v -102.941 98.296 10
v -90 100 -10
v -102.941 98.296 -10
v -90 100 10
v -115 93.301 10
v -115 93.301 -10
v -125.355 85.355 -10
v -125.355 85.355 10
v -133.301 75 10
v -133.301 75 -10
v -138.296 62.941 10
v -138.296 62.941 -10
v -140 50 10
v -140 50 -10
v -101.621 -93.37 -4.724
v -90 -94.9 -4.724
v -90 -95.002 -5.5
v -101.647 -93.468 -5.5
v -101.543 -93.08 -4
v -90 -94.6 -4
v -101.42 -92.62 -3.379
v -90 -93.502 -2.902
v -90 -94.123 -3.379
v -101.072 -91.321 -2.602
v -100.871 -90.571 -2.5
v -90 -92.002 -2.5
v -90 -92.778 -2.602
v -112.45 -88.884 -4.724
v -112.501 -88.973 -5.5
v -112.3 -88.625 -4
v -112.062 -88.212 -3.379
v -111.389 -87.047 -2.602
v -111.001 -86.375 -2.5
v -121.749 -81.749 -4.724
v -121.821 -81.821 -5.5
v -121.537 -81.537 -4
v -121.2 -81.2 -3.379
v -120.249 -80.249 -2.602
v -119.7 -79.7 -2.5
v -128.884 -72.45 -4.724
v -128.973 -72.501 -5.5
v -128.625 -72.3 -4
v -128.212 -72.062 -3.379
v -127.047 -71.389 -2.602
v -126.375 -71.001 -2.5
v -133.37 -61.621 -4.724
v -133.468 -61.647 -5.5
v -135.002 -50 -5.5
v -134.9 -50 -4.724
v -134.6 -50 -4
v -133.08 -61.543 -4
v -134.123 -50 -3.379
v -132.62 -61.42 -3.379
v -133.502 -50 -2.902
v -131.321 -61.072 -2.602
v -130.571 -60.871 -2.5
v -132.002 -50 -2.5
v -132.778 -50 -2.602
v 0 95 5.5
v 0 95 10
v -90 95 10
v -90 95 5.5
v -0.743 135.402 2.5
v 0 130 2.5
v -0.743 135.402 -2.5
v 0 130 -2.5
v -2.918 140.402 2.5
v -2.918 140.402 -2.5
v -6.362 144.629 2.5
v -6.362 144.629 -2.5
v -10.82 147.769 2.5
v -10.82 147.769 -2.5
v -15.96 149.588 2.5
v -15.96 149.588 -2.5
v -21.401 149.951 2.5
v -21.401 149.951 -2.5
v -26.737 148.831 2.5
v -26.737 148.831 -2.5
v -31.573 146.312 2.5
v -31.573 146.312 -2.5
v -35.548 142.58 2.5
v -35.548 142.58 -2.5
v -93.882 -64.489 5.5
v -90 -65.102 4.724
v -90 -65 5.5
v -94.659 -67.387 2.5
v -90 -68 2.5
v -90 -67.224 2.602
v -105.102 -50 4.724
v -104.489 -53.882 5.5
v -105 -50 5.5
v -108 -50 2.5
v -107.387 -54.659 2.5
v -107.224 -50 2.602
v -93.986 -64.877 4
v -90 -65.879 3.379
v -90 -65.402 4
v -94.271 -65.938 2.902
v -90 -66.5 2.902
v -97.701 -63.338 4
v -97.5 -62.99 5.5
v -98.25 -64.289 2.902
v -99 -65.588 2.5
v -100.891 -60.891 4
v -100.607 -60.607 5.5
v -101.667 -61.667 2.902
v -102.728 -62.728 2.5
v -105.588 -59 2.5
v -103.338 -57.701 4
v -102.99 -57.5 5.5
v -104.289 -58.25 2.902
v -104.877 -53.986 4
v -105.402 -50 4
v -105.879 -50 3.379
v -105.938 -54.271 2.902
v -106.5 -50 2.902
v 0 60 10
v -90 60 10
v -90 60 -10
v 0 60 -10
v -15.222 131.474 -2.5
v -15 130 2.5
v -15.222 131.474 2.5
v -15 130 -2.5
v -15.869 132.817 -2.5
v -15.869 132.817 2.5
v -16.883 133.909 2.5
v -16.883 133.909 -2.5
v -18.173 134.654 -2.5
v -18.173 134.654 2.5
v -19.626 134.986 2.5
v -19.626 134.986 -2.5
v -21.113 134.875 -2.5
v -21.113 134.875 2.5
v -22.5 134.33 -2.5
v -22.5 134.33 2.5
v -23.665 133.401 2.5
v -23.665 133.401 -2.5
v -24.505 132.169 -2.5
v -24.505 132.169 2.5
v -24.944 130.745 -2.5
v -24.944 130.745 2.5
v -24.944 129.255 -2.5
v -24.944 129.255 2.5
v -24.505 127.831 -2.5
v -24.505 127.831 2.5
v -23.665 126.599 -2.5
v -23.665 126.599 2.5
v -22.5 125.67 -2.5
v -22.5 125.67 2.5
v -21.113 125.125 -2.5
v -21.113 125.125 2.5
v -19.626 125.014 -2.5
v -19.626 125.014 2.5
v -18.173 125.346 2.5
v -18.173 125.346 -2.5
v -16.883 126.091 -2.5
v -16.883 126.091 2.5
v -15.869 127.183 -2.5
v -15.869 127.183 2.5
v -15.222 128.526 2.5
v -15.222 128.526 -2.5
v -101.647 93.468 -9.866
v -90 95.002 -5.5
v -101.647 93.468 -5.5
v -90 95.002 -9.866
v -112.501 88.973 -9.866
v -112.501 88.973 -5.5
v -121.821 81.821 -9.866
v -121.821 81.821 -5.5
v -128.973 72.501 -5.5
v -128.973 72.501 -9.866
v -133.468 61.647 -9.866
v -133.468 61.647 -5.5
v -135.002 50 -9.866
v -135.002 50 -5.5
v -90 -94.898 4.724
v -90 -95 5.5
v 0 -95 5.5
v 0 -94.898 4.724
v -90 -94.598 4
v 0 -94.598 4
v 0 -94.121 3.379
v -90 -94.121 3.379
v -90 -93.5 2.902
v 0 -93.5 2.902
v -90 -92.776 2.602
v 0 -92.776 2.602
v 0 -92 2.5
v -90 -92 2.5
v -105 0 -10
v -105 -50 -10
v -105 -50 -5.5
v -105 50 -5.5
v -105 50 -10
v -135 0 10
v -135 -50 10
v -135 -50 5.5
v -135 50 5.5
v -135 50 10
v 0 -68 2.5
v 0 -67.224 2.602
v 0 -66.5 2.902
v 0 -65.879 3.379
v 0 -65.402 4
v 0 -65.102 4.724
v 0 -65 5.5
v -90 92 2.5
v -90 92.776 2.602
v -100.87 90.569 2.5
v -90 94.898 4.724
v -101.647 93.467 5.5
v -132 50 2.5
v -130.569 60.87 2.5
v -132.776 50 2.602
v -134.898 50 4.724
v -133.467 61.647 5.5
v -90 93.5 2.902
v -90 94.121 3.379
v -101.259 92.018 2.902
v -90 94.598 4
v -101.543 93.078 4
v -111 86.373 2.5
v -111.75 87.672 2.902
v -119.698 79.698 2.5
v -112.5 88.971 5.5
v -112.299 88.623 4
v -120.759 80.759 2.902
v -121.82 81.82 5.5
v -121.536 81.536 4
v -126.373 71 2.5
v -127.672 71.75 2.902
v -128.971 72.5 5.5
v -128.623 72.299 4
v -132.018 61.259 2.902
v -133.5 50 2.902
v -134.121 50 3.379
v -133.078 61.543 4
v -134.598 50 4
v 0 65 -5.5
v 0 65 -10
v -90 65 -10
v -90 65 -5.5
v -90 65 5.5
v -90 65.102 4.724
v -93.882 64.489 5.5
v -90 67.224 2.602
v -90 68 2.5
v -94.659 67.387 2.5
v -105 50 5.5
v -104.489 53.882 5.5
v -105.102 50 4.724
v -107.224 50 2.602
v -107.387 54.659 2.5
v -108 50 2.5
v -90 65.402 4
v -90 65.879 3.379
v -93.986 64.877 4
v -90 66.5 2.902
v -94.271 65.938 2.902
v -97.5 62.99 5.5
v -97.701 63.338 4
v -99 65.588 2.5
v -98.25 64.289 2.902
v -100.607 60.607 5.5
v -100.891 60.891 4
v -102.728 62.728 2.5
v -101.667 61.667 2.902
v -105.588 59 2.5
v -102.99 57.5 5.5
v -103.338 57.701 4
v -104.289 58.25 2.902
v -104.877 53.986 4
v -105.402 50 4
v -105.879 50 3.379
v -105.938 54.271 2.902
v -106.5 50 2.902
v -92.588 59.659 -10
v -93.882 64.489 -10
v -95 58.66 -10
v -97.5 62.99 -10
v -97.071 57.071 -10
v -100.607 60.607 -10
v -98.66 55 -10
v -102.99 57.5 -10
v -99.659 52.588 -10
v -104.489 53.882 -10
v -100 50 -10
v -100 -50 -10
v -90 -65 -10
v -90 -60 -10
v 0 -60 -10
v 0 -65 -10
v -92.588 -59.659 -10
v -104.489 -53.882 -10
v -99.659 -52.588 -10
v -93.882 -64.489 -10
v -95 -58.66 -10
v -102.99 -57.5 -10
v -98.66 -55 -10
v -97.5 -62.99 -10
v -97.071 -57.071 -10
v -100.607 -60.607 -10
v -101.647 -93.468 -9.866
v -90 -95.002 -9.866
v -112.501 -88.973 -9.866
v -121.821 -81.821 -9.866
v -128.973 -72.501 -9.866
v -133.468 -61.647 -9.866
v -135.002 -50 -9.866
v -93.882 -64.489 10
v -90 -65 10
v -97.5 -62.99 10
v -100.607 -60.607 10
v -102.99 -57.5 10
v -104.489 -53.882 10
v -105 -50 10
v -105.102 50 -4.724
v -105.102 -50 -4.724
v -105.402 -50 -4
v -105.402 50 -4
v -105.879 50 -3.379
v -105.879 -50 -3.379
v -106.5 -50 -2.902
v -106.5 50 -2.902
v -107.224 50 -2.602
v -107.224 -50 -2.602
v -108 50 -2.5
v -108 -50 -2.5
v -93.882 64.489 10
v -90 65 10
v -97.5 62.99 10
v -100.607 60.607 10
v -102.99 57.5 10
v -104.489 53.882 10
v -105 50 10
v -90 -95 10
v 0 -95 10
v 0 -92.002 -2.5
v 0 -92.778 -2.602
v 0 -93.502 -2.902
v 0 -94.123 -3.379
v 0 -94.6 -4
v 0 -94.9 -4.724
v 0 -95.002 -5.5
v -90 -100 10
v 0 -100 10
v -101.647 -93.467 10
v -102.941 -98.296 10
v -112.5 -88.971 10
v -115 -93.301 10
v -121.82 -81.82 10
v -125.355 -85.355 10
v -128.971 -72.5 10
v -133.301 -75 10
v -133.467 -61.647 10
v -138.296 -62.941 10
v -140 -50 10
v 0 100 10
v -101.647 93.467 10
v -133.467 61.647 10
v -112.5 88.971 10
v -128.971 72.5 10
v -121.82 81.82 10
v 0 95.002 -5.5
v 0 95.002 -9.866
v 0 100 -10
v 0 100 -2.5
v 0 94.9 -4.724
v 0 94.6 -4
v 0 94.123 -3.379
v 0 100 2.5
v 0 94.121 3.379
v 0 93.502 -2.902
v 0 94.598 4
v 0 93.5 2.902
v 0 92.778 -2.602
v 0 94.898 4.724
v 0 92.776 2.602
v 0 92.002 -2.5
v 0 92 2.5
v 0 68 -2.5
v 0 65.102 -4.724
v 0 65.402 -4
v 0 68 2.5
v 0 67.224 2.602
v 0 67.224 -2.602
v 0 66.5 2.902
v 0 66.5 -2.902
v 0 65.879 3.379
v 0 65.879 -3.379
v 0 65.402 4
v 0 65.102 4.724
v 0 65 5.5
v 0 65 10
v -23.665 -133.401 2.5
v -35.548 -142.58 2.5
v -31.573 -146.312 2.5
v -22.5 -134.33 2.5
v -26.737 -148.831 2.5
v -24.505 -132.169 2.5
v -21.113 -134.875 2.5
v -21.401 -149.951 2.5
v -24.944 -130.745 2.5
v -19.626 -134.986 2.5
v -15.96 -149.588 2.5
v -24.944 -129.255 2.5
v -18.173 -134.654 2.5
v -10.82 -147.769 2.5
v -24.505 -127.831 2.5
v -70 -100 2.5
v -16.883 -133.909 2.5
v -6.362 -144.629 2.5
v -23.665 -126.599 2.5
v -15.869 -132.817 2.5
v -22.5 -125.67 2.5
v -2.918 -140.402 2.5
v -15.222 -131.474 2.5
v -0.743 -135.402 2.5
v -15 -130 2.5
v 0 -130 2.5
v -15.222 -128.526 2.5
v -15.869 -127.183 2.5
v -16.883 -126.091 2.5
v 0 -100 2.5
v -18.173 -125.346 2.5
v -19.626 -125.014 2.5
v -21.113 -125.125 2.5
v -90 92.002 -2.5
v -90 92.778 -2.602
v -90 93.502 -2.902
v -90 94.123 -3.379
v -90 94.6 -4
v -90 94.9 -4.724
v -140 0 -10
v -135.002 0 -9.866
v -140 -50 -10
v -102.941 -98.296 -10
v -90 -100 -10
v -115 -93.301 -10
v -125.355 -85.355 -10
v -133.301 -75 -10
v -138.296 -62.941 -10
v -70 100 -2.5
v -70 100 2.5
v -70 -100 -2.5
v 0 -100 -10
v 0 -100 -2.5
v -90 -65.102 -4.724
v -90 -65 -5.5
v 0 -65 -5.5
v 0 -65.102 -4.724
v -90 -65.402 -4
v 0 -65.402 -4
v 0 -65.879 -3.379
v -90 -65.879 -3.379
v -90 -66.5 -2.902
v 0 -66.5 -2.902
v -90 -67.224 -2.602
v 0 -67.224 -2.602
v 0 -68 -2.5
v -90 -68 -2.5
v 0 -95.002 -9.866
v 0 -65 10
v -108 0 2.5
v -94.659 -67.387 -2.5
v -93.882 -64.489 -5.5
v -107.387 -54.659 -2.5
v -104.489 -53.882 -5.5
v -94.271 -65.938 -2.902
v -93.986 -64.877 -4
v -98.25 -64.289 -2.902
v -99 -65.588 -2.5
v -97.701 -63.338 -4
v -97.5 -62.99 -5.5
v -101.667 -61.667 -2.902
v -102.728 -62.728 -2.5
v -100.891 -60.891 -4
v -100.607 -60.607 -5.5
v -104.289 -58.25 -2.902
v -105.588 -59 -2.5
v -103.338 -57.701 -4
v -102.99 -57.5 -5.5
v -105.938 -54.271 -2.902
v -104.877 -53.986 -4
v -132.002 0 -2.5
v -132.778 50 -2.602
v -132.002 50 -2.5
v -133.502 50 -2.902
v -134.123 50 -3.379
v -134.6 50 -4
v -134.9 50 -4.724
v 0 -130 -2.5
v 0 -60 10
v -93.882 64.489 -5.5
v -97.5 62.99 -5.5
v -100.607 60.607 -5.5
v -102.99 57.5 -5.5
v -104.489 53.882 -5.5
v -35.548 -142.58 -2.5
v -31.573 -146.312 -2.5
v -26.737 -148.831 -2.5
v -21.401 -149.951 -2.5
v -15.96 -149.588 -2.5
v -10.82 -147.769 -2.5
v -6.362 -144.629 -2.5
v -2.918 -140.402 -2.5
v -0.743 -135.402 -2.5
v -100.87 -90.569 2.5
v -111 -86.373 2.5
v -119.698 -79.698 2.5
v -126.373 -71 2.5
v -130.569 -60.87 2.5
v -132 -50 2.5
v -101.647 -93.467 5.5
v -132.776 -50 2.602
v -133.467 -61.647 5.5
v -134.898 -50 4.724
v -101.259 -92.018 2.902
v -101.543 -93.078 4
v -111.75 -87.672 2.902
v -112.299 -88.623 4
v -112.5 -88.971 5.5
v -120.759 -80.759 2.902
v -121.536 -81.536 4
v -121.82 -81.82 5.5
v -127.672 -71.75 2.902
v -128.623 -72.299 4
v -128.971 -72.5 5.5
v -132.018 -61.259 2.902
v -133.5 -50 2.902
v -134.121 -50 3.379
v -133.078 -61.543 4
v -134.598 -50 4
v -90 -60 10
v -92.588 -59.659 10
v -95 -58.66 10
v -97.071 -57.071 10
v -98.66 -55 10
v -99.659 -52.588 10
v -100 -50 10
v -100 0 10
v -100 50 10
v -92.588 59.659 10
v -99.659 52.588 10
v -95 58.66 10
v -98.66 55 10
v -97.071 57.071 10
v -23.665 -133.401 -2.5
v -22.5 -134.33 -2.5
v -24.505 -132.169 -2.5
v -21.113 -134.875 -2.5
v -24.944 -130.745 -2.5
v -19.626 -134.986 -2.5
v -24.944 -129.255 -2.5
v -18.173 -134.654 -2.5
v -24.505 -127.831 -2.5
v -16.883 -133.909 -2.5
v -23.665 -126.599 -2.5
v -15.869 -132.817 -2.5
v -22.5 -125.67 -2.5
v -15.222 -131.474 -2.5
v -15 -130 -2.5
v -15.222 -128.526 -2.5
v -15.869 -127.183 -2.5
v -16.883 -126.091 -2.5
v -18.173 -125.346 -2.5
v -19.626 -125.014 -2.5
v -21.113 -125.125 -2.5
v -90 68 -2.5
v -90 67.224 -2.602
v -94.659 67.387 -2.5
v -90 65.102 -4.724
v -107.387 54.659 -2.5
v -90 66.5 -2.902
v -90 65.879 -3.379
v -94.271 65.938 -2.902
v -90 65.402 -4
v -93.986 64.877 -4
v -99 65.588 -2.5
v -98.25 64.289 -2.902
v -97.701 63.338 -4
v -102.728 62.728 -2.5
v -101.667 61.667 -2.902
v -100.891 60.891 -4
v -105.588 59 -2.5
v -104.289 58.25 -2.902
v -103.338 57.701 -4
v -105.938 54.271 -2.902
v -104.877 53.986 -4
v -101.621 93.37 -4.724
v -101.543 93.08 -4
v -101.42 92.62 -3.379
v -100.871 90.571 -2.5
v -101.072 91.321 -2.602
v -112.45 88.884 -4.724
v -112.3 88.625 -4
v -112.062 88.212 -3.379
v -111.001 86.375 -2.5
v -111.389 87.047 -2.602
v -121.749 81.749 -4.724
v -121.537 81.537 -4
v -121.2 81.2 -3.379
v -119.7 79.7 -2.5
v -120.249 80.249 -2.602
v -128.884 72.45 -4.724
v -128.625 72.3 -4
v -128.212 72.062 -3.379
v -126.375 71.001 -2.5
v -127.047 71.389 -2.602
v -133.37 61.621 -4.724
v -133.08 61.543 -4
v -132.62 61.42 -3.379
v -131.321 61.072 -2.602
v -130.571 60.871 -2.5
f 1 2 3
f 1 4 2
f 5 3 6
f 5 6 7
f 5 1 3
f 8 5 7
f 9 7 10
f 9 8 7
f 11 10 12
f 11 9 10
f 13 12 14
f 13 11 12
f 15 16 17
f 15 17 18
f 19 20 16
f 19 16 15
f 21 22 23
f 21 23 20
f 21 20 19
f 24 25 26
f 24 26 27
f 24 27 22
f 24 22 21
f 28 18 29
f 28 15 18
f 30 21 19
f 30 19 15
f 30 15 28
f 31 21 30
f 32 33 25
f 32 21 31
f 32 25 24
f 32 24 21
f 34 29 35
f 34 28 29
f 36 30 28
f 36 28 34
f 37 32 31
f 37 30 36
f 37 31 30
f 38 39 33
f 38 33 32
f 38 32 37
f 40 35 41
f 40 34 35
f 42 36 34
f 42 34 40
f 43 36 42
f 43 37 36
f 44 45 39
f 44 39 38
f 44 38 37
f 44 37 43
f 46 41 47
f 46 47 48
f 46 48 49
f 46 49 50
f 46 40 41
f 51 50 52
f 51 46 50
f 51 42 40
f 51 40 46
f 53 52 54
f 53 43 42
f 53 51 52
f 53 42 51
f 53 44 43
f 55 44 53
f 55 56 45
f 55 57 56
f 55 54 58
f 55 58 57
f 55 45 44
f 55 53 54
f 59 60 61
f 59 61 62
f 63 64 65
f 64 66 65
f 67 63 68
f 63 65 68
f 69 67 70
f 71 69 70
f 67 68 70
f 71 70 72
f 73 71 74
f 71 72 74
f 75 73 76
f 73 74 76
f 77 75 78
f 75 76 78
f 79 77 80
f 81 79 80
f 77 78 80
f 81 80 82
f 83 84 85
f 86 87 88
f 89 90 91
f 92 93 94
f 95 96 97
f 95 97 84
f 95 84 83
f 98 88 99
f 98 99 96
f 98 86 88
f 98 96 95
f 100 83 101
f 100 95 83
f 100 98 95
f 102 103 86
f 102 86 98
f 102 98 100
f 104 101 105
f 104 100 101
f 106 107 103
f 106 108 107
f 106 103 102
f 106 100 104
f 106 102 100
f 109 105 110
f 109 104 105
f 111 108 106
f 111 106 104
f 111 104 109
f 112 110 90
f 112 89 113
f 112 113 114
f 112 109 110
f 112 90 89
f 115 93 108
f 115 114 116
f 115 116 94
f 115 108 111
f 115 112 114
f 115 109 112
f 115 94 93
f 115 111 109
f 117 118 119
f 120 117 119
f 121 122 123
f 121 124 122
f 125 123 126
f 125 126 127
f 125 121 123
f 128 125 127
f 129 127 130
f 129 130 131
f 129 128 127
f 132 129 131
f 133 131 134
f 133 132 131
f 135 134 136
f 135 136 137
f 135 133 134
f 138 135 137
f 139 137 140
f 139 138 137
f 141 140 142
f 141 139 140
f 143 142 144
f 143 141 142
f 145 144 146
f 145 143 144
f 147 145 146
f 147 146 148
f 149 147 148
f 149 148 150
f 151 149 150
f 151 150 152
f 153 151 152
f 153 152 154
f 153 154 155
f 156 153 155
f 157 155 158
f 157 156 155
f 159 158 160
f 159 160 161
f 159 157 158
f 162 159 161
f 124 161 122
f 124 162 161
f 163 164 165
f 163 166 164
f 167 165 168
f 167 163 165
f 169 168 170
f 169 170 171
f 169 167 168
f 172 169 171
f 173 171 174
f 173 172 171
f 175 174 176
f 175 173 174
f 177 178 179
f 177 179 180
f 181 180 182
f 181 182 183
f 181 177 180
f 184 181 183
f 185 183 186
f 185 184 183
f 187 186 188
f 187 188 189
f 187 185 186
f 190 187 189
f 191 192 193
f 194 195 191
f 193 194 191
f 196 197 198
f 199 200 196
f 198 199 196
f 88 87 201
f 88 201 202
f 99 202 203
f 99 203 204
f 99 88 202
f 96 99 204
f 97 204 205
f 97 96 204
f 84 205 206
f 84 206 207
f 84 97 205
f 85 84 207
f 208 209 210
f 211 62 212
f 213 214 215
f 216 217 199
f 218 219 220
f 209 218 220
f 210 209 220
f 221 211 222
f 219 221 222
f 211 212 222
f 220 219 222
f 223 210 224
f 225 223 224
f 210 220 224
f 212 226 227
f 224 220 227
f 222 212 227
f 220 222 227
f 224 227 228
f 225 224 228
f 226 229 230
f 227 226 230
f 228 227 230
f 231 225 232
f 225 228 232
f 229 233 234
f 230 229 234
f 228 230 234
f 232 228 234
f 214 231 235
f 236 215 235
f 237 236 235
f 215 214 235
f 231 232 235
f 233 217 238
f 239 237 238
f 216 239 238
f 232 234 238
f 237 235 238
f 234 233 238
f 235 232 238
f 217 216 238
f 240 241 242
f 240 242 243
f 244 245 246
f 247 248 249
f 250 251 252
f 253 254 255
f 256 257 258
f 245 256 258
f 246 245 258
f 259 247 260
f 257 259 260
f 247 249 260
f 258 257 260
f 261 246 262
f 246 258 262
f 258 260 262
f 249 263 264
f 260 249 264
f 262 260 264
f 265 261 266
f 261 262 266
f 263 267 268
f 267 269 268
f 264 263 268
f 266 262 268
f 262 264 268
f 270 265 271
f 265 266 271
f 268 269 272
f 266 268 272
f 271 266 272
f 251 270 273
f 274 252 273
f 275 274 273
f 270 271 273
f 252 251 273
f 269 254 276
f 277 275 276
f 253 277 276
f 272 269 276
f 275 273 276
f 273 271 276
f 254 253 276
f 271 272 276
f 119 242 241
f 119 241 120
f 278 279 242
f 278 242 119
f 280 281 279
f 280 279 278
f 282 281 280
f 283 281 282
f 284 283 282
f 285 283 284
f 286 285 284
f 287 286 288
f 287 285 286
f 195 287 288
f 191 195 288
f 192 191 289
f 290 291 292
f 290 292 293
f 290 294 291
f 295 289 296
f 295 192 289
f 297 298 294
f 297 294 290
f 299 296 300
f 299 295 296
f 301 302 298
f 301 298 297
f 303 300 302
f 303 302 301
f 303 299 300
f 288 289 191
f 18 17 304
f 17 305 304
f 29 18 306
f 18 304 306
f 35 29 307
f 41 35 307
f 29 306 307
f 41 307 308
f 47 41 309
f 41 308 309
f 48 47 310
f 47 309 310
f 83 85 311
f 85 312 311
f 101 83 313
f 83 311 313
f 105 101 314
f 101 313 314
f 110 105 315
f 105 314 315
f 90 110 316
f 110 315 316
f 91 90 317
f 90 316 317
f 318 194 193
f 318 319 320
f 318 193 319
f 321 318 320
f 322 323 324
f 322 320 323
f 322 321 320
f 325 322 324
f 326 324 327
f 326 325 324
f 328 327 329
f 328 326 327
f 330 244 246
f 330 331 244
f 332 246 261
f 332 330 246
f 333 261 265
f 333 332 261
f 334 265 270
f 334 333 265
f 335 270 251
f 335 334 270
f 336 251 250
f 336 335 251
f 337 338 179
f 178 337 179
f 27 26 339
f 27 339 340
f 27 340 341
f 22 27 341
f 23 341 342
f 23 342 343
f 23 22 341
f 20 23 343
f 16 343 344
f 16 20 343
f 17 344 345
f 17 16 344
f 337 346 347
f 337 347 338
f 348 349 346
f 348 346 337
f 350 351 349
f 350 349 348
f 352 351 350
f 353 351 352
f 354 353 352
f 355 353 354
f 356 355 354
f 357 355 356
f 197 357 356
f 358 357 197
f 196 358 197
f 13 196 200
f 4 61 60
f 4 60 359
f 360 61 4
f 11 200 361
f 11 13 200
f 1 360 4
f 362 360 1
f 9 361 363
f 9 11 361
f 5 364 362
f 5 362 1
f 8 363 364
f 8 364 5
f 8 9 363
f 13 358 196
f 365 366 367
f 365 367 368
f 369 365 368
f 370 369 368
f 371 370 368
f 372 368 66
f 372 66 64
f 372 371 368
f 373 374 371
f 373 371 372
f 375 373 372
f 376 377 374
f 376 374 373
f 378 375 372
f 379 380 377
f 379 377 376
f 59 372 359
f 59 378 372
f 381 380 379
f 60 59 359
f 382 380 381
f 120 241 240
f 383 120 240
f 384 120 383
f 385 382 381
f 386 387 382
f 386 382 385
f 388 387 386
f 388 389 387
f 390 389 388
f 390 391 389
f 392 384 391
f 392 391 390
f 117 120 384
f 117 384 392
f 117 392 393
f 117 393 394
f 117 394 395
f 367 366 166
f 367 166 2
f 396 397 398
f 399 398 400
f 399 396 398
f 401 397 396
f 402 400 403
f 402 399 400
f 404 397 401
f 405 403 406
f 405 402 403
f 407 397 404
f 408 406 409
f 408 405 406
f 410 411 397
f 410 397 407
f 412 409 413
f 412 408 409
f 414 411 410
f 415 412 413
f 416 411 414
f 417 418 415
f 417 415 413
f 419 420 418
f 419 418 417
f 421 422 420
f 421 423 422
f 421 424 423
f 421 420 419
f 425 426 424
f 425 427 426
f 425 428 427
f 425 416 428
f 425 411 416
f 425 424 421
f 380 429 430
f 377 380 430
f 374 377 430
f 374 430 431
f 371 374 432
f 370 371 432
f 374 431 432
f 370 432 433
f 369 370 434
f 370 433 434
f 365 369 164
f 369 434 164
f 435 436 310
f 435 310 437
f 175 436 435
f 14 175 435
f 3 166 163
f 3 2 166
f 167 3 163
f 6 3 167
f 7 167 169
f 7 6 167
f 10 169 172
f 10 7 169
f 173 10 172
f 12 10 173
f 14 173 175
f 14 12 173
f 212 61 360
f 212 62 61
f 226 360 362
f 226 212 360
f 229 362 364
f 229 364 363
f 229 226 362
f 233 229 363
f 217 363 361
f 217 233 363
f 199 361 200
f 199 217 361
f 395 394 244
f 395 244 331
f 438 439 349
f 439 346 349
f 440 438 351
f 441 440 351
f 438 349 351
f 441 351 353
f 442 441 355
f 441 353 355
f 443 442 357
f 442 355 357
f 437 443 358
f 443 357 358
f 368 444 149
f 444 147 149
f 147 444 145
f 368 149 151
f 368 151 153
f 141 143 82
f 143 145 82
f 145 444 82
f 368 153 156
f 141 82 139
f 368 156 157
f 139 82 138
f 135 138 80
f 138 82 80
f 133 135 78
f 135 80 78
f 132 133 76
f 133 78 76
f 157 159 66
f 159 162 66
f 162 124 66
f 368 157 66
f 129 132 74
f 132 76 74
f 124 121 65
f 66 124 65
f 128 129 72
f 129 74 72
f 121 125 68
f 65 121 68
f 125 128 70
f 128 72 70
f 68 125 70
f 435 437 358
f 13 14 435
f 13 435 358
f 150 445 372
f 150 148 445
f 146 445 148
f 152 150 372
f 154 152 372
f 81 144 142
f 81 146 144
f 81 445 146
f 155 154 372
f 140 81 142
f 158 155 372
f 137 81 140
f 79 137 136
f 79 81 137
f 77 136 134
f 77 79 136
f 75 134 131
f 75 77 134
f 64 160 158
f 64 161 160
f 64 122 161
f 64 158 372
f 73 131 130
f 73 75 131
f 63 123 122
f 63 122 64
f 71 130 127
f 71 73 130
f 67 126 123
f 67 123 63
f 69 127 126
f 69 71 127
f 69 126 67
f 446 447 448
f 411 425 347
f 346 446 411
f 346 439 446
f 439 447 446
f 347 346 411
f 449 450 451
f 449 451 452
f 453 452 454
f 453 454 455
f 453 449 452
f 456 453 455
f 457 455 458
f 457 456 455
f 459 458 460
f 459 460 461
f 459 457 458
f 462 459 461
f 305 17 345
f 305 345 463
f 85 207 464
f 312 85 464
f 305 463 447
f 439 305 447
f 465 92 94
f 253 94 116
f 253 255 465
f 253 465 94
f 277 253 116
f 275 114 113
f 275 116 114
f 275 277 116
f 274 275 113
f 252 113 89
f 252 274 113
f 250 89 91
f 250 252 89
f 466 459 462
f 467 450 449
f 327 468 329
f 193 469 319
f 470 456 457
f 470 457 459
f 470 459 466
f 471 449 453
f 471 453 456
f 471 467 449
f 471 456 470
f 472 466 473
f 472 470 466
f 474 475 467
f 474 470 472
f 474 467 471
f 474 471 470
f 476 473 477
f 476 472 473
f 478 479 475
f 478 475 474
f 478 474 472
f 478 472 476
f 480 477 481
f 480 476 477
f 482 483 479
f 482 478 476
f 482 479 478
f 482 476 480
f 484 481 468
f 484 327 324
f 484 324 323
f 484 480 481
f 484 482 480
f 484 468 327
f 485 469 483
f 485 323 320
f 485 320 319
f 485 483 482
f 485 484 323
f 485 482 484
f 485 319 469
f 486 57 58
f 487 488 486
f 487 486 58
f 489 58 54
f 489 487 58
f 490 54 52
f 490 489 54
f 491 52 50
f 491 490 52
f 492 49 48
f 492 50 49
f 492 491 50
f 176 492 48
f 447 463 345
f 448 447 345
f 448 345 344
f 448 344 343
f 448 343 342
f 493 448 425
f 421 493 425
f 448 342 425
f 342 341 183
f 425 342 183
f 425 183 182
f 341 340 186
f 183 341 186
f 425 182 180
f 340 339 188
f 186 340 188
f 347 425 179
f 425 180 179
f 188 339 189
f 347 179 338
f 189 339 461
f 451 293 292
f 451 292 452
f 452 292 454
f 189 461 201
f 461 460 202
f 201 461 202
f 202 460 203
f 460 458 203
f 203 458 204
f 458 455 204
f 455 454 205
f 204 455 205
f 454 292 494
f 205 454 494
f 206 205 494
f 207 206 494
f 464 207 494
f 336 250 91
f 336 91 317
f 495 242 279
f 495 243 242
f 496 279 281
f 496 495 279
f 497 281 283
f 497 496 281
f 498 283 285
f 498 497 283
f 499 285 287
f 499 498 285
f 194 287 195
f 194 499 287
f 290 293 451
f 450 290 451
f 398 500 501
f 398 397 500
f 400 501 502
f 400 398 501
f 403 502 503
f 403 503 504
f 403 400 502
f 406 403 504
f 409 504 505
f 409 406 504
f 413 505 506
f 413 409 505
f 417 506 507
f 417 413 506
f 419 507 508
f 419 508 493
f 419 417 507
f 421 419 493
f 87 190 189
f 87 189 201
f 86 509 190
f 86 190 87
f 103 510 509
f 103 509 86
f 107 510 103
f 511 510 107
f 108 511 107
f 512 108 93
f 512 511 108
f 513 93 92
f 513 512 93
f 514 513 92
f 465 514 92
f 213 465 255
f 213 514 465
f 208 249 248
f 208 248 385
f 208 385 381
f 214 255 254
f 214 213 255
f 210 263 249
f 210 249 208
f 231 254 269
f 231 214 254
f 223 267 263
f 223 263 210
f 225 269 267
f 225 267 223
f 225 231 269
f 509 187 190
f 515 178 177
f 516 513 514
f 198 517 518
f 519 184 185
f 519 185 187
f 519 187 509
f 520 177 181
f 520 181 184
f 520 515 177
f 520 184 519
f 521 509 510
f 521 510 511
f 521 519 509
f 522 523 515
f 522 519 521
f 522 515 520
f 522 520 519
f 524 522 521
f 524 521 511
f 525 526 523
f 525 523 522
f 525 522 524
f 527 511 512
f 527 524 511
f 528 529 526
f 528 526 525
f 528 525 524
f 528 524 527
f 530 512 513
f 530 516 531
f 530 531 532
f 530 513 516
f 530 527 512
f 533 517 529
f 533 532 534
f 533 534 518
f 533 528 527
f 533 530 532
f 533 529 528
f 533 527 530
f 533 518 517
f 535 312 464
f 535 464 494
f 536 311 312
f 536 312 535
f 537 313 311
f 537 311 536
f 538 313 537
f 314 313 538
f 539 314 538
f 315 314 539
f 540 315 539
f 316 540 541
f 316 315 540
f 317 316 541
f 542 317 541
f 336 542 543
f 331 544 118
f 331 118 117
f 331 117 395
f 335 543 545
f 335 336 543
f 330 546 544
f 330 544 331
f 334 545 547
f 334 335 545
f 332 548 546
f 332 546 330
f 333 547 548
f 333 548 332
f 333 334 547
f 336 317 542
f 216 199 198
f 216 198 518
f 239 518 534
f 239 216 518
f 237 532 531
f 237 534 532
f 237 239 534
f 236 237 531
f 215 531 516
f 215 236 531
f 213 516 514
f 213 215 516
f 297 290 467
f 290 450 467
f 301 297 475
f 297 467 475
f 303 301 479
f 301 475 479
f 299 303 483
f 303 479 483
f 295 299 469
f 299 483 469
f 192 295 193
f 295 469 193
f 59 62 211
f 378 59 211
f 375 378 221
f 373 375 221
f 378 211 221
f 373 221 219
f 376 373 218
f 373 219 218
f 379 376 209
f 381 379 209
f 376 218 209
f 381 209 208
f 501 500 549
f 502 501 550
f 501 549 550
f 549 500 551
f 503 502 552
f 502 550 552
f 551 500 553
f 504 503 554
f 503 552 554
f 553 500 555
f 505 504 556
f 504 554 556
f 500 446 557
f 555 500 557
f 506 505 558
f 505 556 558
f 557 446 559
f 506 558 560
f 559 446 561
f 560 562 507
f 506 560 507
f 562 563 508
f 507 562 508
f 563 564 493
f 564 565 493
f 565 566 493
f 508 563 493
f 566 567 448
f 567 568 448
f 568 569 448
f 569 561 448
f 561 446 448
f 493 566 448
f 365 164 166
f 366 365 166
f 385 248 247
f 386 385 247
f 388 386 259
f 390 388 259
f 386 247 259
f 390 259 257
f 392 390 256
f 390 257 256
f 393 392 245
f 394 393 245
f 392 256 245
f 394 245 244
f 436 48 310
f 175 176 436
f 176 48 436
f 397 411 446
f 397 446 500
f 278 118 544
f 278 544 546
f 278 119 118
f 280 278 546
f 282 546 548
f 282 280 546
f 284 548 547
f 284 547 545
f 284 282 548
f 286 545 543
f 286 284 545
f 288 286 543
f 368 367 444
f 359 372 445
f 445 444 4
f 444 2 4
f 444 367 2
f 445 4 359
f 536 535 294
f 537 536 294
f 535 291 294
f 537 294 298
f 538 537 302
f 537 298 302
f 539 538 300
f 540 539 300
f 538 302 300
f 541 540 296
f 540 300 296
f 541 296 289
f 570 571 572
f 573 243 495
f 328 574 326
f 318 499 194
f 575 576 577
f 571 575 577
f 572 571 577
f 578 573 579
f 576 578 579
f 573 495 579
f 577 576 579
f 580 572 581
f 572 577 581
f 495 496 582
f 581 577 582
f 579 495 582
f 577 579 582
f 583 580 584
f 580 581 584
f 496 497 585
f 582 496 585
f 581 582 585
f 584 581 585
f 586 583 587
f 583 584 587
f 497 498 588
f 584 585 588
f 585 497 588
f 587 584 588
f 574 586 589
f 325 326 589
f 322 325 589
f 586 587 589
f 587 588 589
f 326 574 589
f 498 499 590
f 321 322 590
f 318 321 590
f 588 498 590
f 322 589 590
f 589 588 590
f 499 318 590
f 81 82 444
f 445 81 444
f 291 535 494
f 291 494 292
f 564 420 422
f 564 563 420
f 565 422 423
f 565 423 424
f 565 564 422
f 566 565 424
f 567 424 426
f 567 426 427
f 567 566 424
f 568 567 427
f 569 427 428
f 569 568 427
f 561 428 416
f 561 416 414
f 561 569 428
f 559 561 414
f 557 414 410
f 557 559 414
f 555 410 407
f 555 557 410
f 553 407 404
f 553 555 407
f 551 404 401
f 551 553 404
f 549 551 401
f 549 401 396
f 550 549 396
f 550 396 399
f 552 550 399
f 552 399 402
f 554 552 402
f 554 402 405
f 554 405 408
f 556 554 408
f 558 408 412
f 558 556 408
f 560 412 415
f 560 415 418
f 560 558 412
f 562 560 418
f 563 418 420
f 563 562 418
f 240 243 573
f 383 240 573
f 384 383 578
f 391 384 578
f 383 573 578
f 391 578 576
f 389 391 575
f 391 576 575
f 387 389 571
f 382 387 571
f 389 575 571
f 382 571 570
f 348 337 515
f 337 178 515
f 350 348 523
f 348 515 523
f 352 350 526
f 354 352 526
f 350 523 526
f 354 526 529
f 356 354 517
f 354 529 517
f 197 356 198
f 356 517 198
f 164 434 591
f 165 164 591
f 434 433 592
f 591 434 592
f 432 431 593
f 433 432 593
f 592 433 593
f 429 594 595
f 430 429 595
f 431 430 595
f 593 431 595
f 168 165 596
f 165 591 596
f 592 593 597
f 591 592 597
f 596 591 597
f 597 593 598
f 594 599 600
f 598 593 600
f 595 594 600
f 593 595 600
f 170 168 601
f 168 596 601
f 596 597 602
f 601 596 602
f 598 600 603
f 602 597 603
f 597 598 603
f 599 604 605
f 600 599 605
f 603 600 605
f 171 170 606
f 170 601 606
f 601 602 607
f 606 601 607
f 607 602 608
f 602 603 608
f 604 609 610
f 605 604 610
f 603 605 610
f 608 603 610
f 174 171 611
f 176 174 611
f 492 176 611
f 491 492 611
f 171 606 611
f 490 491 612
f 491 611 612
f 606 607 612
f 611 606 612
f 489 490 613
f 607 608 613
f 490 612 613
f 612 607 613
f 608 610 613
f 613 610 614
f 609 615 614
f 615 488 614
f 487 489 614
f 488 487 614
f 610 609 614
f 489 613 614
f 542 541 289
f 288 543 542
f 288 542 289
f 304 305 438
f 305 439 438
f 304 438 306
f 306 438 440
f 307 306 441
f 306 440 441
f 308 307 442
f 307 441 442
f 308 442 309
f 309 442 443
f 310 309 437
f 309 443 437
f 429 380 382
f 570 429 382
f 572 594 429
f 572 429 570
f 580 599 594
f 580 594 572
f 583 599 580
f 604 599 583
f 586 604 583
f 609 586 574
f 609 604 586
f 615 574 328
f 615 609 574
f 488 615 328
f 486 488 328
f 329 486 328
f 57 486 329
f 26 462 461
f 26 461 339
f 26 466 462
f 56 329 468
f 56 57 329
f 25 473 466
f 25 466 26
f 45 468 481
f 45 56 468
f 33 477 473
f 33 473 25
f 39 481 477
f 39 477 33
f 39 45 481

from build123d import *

# Parameters (mm, degrees)
F4_R     = 5
F5_DEPTH = 2.5


with BuildPart() as f2:
    # F2: sweep along a path in F0
    with BuildLine(Plane.XY) as f2_path:
        Line((0, 60), (-90, 60))
        ThreePointArc((-90, 60), (-97.0710678119, 57.0710678119), (-100, 50))
        Line((-100, 50), (-100, 0))
    # F1 (on Right) → F2 (sweep)
    with BuildSketch(Plane.YZ):
        with BuildLine():
            Line((95.0018057663, -9.8656333278), (100, -10))
            Line((100, -10), (100, 10))
            Line((100, 10), (95, 10))
            Line((95, 10), (95, 5.5))
            ThreePointArc((95, 5.5), (94.1213203436, 3.3786796564), (92, 2.5))
            Line((92, 2.5), (68, 2.5))
            ThreePointArc((68, 2.5), (65.8786796564, 3.3786796564), (65, 5.5))
            Line((65, 5.5), (65, 10))
            Line((65, 10), (60, 10))
            Line((60, 10), (60, 0))
            Line((60, 0), (60, -10))
            Line((60, -10), (65, -10))
            Line((65, -10), (65, -5.5))
            ThreePointArc((65, -5.5), (65.8786796564, -3.3786796564), (68, -2.5))
            Line((68, -2.5), (92.0018057663, -2.5))
            ThreePointArc((92.0018057663, -2.5), (94.1231261099, -3.3786796564), (95.0018057663, -5.5))
            Line((95.0018057663, -5.5), (95.0018057663, -9.8656333278))
        make_face()
    sweep(path=f2_path.line)

    # F3: F2 across plane


with BuildPart() as f2_1:
    add(f2.part)
    add(f2.part.mirror(Plane.XZ))

    # F4 (on Top) → F5 (join, symmetric)
    with BuildSketch(Plane.XY):
        with BuildLine():
            Line((-70, 100), (0, 100))
            Line((0, 100), (0, 130))
            ThreePointArc((0, 130), (-13.3277028936, 148.8541892248), (-35.5480451324, 142.5800752207))
            Line((-35.5480451324, 142.5800752207), (-70, 100))
        make_face()
        with Locations((-20, 130)):
            Circle(F4_R, mode=Mode.SUBTRACT)
        with BuildLine():
            Line((0, -130), (0, -100))
            Line((0, -100), (-70, -100))
            Line((-70, -100), (-35.5480451324, -142.5800752207))
            ThreePointArc((-35.5480451324, -142.5800752207), (-13.3277028936, -148.8541892248), (0, -130))
        make_face()
        with Locations((-20, -130)):
            Circle(F4_R, mode=Mode.SUBTRACT)
    extrude(amount=F5_DEPTH, both=True)


solid = f2_1.part
